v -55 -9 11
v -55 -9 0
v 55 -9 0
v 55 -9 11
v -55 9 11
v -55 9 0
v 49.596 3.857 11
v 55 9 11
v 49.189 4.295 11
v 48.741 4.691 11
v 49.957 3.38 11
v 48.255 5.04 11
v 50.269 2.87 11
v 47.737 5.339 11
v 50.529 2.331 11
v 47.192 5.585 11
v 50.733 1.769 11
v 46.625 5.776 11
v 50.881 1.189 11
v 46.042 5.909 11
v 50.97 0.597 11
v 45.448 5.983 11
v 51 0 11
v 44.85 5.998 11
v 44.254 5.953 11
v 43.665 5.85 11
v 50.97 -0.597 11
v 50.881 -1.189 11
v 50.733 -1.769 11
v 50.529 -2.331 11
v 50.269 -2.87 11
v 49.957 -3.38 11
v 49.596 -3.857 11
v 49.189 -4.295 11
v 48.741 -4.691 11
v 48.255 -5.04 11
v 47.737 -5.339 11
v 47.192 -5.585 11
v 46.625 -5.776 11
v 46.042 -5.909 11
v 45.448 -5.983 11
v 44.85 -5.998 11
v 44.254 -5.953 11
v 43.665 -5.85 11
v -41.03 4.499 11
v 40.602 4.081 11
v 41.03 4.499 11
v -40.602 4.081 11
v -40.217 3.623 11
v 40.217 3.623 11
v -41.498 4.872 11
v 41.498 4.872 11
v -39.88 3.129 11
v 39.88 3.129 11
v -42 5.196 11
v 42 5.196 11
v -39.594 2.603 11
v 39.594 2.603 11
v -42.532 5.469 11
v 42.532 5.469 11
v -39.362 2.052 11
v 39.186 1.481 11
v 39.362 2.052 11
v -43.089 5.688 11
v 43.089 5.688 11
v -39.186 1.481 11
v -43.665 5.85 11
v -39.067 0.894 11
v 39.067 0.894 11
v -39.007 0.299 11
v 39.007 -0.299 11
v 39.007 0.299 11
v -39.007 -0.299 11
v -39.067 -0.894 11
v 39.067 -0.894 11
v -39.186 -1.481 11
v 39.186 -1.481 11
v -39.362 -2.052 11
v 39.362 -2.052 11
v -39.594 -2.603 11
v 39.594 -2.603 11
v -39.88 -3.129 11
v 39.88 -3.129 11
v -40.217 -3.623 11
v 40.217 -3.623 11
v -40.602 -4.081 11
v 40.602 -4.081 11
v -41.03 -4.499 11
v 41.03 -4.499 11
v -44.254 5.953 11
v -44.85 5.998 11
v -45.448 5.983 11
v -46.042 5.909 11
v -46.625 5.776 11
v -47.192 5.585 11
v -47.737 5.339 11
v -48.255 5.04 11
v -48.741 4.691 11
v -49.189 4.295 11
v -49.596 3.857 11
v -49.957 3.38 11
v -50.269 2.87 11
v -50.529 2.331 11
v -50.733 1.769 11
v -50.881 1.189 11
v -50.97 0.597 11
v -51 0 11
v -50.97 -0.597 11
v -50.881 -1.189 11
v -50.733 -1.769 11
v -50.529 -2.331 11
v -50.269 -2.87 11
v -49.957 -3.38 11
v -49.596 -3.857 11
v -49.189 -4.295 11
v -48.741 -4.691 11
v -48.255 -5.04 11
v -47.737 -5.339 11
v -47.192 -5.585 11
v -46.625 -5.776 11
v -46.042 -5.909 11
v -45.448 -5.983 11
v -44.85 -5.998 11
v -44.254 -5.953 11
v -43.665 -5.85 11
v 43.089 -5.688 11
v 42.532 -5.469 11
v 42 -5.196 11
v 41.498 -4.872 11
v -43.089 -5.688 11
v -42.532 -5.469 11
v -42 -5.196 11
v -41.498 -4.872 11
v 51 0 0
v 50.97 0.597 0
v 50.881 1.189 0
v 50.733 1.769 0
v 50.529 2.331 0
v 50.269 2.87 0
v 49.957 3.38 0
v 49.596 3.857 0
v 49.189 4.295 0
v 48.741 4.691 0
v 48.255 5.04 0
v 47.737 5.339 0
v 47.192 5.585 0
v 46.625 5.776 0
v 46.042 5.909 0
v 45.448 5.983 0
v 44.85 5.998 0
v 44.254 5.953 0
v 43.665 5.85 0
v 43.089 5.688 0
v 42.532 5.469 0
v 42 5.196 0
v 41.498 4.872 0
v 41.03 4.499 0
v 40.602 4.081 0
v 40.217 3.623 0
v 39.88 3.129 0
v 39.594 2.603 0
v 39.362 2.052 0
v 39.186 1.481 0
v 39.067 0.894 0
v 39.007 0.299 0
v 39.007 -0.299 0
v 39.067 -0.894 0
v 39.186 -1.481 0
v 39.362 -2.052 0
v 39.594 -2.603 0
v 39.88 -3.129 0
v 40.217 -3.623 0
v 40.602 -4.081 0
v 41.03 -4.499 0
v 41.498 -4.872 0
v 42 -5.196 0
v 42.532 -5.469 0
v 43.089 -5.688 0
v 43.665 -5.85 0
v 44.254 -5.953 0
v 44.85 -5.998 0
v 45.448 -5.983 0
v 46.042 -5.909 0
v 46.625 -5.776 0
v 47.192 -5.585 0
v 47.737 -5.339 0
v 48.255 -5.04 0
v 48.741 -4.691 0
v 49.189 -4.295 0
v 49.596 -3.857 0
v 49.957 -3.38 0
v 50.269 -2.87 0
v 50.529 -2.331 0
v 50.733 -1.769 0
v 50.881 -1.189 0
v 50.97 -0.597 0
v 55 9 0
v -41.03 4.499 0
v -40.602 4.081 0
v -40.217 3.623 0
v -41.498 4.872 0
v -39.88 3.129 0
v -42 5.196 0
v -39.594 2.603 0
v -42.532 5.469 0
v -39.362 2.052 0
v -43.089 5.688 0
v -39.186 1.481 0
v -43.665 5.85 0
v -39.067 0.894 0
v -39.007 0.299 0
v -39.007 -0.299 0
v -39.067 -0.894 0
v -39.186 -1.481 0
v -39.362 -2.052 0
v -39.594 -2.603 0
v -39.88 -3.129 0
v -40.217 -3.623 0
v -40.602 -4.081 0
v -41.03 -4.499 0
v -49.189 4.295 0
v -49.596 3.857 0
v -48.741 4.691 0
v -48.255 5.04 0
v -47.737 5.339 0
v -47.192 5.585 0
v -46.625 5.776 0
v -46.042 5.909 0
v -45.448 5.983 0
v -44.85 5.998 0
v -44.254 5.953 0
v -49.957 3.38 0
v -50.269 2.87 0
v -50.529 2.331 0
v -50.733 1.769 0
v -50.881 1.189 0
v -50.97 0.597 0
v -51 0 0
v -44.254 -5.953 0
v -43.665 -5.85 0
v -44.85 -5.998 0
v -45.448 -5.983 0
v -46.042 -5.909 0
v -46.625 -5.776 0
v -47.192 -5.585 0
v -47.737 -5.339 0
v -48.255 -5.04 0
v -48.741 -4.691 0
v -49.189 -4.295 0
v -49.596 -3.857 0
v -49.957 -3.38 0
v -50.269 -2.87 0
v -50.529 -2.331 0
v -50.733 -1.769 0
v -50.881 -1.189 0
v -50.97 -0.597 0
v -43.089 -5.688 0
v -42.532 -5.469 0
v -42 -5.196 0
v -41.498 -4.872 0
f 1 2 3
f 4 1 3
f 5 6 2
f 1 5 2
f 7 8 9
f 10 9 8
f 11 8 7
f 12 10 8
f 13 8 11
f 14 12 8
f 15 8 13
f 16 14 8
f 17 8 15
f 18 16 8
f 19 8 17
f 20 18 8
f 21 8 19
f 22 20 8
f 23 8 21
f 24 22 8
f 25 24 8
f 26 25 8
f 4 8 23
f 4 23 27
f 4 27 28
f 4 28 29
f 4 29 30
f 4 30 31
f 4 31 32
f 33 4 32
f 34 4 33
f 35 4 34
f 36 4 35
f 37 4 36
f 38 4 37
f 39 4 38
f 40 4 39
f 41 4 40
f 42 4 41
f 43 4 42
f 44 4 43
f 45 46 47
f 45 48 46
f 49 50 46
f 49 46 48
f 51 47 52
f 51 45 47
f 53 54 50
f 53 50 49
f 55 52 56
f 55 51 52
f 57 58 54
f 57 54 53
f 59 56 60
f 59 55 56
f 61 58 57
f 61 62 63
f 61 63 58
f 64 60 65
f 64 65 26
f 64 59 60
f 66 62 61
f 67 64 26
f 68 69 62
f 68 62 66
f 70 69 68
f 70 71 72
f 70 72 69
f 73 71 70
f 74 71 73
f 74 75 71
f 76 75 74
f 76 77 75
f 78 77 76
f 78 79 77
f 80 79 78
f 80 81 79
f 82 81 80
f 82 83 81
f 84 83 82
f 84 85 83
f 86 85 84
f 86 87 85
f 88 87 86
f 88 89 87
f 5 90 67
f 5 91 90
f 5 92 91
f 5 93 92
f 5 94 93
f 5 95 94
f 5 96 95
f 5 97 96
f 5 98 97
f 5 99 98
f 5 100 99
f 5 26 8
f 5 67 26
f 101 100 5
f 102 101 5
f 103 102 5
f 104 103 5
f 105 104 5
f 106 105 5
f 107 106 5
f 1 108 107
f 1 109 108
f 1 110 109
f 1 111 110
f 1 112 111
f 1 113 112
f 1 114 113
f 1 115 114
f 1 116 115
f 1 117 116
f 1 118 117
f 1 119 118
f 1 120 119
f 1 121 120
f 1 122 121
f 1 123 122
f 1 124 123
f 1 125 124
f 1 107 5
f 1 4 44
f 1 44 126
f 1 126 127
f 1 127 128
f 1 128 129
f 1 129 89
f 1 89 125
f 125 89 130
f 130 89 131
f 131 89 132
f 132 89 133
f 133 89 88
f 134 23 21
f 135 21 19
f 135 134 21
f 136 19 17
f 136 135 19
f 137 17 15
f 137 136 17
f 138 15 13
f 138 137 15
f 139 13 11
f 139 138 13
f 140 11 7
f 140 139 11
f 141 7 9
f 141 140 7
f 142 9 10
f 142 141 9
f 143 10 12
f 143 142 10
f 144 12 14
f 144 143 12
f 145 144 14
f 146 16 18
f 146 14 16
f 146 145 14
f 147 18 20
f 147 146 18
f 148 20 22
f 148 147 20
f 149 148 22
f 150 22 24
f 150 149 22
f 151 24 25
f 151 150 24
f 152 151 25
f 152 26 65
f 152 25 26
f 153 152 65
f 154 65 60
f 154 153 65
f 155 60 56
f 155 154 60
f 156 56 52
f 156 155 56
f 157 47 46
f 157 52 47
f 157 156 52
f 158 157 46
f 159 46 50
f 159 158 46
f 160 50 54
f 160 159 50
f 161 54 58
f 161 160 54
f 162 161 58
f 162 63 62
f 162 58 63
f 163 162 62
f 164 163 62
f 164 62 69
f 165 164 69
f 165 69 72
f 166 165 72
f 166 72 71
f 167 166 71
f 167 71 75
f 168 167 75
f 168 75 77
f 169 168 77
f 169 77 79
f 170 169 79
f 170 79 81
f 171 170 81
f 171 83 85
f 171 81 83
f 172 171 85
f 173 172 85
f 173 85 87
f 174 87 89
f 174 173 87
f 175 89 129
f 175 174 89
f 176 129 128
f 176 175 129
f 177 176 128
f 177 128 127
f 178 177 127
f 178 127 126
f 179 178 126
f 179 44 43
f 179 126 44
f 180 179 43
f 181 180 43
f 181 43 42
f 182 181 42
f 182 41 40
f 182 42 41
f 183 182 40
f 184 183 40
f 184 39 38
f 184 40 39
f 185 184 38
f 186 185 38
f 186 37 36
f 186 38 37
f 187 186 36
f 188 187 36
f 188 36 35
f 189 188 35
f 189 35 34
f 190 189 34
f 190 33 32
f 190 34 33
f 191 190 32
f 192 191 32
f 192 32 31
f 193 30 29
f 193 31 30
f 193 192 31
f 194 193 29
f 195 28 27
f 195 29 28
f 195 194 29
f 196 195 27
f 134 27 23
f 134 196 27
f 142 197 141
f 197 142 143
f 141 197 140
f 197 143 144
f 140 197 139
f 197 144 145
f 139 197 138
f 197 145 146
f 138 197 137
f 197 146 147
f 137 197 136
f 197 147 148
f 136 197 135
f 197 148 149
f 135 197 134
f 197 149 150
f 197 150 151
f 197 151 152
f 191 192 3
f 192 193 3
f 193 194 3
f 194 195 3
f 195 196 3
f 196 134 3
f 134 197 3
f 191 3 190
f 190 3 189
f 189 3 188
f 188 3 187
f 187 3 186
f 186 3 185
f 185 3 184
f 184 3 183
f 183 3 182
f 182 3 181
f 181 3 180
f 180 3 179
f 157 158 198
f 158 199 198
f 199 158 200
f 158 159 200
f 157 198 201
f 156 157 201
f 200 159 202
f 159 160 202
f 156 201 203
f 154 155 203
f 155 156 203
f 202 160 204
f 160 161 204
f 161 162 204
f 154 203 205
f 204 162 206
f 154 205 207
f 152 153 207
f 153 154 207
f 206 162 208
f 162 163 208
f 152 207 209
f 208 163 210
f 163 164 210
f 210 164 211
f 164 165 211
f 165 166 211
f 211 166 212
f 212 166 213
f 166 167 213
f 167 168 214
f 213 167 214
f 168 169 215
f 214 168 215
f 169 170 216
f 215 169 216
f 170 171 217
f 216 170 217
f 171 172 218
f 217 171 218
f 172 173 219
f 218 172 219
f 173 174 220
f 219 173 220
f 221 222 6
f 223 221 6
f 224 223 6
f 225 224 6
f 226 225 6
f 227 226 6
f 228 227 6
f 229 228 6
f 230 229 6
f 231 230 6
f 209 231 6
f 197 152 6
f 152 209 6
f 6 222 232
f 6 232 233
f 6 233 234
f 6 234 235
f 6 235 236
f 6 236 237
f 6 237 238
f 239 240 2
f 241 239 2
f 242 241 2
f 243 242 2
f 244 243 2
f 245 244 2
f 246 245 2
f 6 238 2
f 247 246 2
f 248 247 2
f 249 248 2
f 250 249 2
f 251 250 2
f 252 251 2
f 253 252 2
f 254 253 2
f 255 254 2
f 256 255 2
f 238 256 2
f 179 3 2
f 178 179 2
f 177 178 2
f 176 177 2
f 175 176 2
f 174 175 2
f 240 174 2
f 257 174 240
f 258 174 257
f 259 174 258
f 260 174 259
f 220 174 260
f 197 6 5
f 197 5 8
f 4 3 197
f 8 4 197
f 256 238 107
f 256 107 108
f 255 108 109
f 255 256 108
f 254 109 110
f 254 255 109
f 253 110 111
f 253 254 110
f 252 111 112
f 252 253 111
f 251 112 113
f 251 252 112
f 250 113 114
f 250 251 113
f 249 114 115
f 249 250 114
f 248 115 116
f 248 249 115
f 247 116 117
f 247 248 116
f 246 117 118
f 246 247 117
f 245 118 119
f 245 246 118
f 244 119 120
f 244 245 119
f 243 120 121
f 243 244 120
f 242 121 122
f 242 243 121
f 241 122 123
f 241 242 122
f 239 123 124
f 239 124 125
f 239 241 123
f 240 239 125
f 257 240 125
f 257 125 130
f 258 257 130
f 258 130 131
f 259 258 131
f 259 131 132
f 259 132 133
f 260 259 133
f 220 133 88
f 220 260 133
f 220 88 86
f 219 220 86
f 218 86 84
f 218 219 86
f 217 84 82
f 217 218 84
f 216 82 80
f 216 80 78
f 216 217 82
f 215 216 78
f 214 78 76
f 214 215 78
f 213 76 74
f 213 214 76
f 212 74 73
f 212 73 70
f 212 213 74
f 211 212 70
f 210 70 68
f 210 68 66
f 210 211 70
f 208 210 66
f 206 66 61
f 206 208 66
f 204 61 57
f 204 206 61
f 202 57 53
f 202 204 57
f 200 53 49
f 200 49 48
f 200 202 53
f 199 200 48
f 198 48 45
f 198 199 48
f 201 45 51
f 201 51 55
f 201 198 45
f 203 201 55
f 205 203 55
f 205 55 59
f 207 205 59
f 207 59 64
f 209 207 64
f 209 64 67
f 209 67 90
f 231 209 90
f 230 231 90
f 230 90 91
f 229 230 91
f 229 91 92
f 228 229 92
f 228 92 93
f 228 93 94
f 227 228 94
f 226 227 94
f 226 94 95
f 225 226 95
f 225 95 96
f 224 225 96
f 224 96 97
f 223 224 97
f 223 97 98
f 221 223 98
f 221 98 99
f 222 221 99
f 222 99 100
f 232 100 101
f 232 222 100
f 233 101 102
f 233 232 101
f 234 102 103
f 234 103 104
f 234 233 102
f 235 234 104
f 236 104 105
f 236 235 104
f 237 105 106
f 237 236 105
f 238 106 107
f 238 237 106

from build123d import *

# Parameters (mm, degrees)
PAD_DEPTH            = 11
PAD_MIRRORED_2_DEPTH = 11


with BuildPart() as part:
    # Sketch → Pad (new body)
    with BuildSketch(Plane.XY):
        with BuildLine():
            Line((0, 0), (39, 0))
            ThreePointArc((51, 0), (45, 6), (39, 0))
            Line((51, 0), (55, 0))
            Line((55, 0), (55, 9))
            Line((55, 9), (0, 9))
            Line((0, 9), (0, 0))
        make_face()
    pad = extrude(amount=PAD_DEPTH)

    # Sketch Mirrored 2 → Pad Mirrored 2 (add)
    with BuildSketch(Plane(origin=(0, 0, 0), x_dir=(-1, 0, 0), z_dir=(0, 0, -1))):
        with BuildLine():
            Line((0, 0), (39, 0))
            ThreePointArc((51, 0), (45, 6), (39, 0))
            Line((51, 0), (55, 0))
            Line((55, 0), (55, 9))
            Line((55, 9), (0, 9))
            Line((0, 9), (0, 0))
        make_face()
    pad_mirrored_2 = extrude(amount=-PAD_MIRRORED_2_DEPTH)

    # Mirrored001: Pad, Pad Mirrored 2 across Sketch H_Axis
    add(pad.mirror(Plane.ZX))
    add(pad_mirrored_2.mirror(Plane.ZX))


solid = part.part
